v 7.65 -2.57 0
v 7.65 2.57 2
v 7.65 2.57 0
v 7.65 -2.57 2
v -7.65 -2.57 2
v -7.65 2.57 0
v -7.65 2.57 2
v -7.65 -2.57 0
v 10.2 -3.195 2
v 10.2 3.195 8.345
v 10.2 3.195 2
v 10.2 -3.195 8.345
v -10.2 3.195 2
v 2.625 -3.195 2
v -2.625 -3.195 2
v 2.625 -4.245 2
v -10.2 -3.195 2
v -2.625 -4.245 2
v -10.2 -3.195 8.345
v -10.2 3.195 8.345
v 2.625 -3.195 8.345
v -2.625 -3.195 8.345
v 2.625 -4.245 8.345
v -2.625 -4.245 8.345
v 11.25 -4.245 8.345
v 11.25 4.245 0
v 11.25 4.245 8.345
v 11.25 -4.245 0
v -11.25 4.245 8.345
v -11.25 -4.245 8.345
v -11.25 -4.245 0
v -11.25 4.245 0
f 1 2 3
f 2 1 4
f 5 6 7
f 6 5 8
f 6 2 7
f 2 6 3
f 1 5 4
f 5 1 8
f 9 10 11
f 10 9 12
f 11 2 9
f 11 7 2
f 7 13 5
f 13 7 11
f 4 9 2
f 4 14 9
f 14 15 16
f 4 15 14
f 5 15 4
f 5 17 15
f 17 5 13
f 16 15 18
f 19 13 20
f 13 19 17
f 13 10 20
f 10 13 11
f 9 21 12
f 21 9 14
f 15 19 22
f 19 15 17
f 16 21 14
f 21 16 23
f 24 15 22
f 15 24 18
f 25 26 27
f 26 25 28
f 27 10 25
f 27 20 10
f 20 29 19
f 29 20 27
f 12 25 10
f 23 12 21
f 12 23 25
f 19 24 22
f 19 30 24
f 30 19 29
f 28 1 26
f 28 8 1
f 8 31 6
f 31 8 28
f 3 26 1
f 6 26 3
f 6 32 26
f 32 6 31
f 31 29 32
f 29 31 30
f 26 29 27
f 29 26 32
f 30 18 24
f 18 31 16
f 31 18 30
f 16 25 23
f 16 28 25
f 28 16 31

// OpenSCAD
//Creative Commons - Attribution - Share Alike license.
//CC BY-SA 3.0
//© 2011 by tagno25

PinX=6;
PinY=2;
xtra=0.1;
/*--------------------------------------------------
-----------------Do Not edit Below------------------
----------Don't blame me if you break it------------
--------------------------------------------------*/

HeaderX=((PinX-1)*2.54)+2.6;
HeaderY=((PinY-1)*2.54)+2.6;

MainX=HeaderX+5.1;
MainY=HeaderY+1.25;

difference() {
	//body
	translate([-(MainX+2.1)/2, -(MainY+2.1)/2, 0]) {
		cube([MainX+2.1, MainY+2.1, 8.345]);	//3x2
	}

	union(){
		//bottom hole
		translate([-HeaderX/2, -HeaderY/2, 0-xtra/2]) {
			cube([HeaderX, HeaderY, 2+xtra]);
		}

		//Main hole
		translate([-MainX/2, -MainY/2, 2]) {
			cube([MainX, MainY, 6.345+xtra]);
		}

		//Side Hole  ==	always same
		translate([-2.625,-(MainY+2.1)/2-xtra/2,2]) {
			cube([5.25,1.06+xtra,6.345+xtra]);
		}
	}
}
